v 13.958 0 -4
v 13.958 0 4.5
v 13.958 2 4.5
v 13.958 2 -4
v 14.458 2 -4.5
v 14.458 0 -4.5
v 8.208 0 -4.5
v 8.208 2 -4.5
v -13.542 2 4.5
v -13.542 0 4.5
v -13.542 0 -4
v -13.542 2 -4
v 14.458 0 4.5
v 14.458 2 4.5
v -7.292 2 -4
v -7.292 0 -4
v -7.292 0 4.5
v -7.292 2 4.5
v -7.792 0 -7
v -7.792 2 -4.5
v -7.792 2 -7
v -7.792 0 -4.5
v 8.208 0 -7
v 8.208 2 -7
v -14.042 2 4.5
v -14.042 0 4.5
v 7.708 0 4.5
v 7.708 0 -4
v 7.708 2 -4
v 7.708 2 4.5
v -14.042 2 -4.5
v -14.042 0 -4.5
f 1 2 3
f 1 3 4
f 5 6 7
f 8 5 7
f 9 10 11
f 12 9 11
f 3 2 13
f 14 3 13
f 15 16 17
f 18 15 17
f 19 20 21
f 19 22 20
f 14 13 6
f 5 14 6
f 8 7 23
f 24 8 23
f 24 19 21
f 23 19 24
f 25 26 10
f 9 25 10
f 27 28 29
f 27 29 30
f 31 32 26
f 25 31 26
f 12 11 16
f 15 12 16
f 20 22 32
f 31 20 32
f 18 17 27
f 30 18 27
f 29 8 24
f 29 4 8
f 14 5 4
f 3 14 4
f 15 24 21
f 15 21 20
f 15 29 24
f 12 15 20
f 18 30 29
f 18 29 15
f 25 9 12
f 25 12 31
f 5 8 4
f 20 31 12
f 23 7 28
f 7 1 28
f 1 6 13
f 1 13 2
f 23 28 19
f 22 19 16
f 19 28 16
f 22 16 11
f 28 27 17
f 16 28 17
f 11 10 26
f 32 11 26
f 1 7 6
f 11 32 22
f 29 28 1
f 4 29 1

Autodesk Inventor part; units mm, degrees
ref_plane "YZ Plane" through (0, 0, 0) normal (1, 0, 0) x (0, 1, 0)
ref_plane "XZ Plane" through (0, 0, 0) normal (0, 1, 0) x (-1, 0, 0)
ref_plane "XY Plane" through (0, 0, 0) normal (0, 0, 1) x (1, 0, 0)
sketch "Szkic2" plane through (0, 0, 0) normal (0, 1, 0) x (-1, 0, 0)
  line L0 (14.0417, 4.5) -> (-14.4583, 4.5)
  line L1 (-14.4583, 4.5) -> (-14.4583, -4.5)
  line L2 (-14.4583, -4.5) -> (14.0417, -4.5)
  line L3 (14.0417, -4.5) -> (14.0417, 4.5)
  line L4 (20.5065, 0) -> (-20.5135, 0)
  line L5 (-0.0035, 27.5792) -> (-0.0035, -16.2627)
  line L6 (7.2917, -4.5) -> (-7.7083, -4.5)
  line L7 (-7.7083, -4.5) -> (-7.7083, -7)
  line L8 (-7.7083, -7) -> (7.2917, -7)
  line L9 (7.2917, -7) -> (7.2917, -4.5)
  line L10 (13.5417, 4.5) -> (13.5417, -4.5)
  line L11 (13.5417, -4) -> (7.2917, -4)
  line L12 (7.7917, -4.5) -> (7.7917, -7)
  line L13 (7.2917, -4) -> (7.2917, -4.5)
  line L14 (7.7917, -7) -> (7.2917, -7)
  line L15 (-8.2083, -4.5) -> (-8.2083, -7)
  line L16 (-8.2083, -7) -> (-7.7083, -7)
  line L17 (7.2917, -4) -> (7.2917, 4.5)
  line L18 (-7.7083, -4.5) -> (-7.7083, 4.5)
  line L19 (-13.9583, 4.5) -> (-13.9583, -4.5)
  line L20 (-7.7083, -4) -> (-13.9583, -4)
  line L21 (-7.7083, -4) -> (-7.7083, -4.5)
  point P0 (0, 0)
  dimension "d7" = 28.5
  dimension "d9" = 9
  dimension "d10" = 4.5
  dimension "d11" = 6.75
  dimension "d12" = 6.75
  dimension "d13" = 0.5
  dimension "d14" = 0.5
  dimension "d15" = 2.5
  dimension "d16" = 0.5
  dimension "d17" = 0.5
  dimension "d20" = 0.5
  dimension "d21" = 0.5
extrude "Wyciągnięcie proste2" add sketch "Szkic2" along normal blind 2 contours L3 L4 L10 L0 | L3 L2 L10 L4 | L17 L4 L5 L0 | L5 L4 L18 L0 | L17 L13 L2 L5 L4 | L10 L2 L13 L11 | L5 L2 L18 L4 | L12 L14 L9 L2 | L19 L4 L1 L0 | L5 L8 L7 L2 | L2 L9 L8 L5 | L19 L2 L1 L4 | L18 L2 L19 L20 | L7 L16 L15 L2
properties part number "prent1"
